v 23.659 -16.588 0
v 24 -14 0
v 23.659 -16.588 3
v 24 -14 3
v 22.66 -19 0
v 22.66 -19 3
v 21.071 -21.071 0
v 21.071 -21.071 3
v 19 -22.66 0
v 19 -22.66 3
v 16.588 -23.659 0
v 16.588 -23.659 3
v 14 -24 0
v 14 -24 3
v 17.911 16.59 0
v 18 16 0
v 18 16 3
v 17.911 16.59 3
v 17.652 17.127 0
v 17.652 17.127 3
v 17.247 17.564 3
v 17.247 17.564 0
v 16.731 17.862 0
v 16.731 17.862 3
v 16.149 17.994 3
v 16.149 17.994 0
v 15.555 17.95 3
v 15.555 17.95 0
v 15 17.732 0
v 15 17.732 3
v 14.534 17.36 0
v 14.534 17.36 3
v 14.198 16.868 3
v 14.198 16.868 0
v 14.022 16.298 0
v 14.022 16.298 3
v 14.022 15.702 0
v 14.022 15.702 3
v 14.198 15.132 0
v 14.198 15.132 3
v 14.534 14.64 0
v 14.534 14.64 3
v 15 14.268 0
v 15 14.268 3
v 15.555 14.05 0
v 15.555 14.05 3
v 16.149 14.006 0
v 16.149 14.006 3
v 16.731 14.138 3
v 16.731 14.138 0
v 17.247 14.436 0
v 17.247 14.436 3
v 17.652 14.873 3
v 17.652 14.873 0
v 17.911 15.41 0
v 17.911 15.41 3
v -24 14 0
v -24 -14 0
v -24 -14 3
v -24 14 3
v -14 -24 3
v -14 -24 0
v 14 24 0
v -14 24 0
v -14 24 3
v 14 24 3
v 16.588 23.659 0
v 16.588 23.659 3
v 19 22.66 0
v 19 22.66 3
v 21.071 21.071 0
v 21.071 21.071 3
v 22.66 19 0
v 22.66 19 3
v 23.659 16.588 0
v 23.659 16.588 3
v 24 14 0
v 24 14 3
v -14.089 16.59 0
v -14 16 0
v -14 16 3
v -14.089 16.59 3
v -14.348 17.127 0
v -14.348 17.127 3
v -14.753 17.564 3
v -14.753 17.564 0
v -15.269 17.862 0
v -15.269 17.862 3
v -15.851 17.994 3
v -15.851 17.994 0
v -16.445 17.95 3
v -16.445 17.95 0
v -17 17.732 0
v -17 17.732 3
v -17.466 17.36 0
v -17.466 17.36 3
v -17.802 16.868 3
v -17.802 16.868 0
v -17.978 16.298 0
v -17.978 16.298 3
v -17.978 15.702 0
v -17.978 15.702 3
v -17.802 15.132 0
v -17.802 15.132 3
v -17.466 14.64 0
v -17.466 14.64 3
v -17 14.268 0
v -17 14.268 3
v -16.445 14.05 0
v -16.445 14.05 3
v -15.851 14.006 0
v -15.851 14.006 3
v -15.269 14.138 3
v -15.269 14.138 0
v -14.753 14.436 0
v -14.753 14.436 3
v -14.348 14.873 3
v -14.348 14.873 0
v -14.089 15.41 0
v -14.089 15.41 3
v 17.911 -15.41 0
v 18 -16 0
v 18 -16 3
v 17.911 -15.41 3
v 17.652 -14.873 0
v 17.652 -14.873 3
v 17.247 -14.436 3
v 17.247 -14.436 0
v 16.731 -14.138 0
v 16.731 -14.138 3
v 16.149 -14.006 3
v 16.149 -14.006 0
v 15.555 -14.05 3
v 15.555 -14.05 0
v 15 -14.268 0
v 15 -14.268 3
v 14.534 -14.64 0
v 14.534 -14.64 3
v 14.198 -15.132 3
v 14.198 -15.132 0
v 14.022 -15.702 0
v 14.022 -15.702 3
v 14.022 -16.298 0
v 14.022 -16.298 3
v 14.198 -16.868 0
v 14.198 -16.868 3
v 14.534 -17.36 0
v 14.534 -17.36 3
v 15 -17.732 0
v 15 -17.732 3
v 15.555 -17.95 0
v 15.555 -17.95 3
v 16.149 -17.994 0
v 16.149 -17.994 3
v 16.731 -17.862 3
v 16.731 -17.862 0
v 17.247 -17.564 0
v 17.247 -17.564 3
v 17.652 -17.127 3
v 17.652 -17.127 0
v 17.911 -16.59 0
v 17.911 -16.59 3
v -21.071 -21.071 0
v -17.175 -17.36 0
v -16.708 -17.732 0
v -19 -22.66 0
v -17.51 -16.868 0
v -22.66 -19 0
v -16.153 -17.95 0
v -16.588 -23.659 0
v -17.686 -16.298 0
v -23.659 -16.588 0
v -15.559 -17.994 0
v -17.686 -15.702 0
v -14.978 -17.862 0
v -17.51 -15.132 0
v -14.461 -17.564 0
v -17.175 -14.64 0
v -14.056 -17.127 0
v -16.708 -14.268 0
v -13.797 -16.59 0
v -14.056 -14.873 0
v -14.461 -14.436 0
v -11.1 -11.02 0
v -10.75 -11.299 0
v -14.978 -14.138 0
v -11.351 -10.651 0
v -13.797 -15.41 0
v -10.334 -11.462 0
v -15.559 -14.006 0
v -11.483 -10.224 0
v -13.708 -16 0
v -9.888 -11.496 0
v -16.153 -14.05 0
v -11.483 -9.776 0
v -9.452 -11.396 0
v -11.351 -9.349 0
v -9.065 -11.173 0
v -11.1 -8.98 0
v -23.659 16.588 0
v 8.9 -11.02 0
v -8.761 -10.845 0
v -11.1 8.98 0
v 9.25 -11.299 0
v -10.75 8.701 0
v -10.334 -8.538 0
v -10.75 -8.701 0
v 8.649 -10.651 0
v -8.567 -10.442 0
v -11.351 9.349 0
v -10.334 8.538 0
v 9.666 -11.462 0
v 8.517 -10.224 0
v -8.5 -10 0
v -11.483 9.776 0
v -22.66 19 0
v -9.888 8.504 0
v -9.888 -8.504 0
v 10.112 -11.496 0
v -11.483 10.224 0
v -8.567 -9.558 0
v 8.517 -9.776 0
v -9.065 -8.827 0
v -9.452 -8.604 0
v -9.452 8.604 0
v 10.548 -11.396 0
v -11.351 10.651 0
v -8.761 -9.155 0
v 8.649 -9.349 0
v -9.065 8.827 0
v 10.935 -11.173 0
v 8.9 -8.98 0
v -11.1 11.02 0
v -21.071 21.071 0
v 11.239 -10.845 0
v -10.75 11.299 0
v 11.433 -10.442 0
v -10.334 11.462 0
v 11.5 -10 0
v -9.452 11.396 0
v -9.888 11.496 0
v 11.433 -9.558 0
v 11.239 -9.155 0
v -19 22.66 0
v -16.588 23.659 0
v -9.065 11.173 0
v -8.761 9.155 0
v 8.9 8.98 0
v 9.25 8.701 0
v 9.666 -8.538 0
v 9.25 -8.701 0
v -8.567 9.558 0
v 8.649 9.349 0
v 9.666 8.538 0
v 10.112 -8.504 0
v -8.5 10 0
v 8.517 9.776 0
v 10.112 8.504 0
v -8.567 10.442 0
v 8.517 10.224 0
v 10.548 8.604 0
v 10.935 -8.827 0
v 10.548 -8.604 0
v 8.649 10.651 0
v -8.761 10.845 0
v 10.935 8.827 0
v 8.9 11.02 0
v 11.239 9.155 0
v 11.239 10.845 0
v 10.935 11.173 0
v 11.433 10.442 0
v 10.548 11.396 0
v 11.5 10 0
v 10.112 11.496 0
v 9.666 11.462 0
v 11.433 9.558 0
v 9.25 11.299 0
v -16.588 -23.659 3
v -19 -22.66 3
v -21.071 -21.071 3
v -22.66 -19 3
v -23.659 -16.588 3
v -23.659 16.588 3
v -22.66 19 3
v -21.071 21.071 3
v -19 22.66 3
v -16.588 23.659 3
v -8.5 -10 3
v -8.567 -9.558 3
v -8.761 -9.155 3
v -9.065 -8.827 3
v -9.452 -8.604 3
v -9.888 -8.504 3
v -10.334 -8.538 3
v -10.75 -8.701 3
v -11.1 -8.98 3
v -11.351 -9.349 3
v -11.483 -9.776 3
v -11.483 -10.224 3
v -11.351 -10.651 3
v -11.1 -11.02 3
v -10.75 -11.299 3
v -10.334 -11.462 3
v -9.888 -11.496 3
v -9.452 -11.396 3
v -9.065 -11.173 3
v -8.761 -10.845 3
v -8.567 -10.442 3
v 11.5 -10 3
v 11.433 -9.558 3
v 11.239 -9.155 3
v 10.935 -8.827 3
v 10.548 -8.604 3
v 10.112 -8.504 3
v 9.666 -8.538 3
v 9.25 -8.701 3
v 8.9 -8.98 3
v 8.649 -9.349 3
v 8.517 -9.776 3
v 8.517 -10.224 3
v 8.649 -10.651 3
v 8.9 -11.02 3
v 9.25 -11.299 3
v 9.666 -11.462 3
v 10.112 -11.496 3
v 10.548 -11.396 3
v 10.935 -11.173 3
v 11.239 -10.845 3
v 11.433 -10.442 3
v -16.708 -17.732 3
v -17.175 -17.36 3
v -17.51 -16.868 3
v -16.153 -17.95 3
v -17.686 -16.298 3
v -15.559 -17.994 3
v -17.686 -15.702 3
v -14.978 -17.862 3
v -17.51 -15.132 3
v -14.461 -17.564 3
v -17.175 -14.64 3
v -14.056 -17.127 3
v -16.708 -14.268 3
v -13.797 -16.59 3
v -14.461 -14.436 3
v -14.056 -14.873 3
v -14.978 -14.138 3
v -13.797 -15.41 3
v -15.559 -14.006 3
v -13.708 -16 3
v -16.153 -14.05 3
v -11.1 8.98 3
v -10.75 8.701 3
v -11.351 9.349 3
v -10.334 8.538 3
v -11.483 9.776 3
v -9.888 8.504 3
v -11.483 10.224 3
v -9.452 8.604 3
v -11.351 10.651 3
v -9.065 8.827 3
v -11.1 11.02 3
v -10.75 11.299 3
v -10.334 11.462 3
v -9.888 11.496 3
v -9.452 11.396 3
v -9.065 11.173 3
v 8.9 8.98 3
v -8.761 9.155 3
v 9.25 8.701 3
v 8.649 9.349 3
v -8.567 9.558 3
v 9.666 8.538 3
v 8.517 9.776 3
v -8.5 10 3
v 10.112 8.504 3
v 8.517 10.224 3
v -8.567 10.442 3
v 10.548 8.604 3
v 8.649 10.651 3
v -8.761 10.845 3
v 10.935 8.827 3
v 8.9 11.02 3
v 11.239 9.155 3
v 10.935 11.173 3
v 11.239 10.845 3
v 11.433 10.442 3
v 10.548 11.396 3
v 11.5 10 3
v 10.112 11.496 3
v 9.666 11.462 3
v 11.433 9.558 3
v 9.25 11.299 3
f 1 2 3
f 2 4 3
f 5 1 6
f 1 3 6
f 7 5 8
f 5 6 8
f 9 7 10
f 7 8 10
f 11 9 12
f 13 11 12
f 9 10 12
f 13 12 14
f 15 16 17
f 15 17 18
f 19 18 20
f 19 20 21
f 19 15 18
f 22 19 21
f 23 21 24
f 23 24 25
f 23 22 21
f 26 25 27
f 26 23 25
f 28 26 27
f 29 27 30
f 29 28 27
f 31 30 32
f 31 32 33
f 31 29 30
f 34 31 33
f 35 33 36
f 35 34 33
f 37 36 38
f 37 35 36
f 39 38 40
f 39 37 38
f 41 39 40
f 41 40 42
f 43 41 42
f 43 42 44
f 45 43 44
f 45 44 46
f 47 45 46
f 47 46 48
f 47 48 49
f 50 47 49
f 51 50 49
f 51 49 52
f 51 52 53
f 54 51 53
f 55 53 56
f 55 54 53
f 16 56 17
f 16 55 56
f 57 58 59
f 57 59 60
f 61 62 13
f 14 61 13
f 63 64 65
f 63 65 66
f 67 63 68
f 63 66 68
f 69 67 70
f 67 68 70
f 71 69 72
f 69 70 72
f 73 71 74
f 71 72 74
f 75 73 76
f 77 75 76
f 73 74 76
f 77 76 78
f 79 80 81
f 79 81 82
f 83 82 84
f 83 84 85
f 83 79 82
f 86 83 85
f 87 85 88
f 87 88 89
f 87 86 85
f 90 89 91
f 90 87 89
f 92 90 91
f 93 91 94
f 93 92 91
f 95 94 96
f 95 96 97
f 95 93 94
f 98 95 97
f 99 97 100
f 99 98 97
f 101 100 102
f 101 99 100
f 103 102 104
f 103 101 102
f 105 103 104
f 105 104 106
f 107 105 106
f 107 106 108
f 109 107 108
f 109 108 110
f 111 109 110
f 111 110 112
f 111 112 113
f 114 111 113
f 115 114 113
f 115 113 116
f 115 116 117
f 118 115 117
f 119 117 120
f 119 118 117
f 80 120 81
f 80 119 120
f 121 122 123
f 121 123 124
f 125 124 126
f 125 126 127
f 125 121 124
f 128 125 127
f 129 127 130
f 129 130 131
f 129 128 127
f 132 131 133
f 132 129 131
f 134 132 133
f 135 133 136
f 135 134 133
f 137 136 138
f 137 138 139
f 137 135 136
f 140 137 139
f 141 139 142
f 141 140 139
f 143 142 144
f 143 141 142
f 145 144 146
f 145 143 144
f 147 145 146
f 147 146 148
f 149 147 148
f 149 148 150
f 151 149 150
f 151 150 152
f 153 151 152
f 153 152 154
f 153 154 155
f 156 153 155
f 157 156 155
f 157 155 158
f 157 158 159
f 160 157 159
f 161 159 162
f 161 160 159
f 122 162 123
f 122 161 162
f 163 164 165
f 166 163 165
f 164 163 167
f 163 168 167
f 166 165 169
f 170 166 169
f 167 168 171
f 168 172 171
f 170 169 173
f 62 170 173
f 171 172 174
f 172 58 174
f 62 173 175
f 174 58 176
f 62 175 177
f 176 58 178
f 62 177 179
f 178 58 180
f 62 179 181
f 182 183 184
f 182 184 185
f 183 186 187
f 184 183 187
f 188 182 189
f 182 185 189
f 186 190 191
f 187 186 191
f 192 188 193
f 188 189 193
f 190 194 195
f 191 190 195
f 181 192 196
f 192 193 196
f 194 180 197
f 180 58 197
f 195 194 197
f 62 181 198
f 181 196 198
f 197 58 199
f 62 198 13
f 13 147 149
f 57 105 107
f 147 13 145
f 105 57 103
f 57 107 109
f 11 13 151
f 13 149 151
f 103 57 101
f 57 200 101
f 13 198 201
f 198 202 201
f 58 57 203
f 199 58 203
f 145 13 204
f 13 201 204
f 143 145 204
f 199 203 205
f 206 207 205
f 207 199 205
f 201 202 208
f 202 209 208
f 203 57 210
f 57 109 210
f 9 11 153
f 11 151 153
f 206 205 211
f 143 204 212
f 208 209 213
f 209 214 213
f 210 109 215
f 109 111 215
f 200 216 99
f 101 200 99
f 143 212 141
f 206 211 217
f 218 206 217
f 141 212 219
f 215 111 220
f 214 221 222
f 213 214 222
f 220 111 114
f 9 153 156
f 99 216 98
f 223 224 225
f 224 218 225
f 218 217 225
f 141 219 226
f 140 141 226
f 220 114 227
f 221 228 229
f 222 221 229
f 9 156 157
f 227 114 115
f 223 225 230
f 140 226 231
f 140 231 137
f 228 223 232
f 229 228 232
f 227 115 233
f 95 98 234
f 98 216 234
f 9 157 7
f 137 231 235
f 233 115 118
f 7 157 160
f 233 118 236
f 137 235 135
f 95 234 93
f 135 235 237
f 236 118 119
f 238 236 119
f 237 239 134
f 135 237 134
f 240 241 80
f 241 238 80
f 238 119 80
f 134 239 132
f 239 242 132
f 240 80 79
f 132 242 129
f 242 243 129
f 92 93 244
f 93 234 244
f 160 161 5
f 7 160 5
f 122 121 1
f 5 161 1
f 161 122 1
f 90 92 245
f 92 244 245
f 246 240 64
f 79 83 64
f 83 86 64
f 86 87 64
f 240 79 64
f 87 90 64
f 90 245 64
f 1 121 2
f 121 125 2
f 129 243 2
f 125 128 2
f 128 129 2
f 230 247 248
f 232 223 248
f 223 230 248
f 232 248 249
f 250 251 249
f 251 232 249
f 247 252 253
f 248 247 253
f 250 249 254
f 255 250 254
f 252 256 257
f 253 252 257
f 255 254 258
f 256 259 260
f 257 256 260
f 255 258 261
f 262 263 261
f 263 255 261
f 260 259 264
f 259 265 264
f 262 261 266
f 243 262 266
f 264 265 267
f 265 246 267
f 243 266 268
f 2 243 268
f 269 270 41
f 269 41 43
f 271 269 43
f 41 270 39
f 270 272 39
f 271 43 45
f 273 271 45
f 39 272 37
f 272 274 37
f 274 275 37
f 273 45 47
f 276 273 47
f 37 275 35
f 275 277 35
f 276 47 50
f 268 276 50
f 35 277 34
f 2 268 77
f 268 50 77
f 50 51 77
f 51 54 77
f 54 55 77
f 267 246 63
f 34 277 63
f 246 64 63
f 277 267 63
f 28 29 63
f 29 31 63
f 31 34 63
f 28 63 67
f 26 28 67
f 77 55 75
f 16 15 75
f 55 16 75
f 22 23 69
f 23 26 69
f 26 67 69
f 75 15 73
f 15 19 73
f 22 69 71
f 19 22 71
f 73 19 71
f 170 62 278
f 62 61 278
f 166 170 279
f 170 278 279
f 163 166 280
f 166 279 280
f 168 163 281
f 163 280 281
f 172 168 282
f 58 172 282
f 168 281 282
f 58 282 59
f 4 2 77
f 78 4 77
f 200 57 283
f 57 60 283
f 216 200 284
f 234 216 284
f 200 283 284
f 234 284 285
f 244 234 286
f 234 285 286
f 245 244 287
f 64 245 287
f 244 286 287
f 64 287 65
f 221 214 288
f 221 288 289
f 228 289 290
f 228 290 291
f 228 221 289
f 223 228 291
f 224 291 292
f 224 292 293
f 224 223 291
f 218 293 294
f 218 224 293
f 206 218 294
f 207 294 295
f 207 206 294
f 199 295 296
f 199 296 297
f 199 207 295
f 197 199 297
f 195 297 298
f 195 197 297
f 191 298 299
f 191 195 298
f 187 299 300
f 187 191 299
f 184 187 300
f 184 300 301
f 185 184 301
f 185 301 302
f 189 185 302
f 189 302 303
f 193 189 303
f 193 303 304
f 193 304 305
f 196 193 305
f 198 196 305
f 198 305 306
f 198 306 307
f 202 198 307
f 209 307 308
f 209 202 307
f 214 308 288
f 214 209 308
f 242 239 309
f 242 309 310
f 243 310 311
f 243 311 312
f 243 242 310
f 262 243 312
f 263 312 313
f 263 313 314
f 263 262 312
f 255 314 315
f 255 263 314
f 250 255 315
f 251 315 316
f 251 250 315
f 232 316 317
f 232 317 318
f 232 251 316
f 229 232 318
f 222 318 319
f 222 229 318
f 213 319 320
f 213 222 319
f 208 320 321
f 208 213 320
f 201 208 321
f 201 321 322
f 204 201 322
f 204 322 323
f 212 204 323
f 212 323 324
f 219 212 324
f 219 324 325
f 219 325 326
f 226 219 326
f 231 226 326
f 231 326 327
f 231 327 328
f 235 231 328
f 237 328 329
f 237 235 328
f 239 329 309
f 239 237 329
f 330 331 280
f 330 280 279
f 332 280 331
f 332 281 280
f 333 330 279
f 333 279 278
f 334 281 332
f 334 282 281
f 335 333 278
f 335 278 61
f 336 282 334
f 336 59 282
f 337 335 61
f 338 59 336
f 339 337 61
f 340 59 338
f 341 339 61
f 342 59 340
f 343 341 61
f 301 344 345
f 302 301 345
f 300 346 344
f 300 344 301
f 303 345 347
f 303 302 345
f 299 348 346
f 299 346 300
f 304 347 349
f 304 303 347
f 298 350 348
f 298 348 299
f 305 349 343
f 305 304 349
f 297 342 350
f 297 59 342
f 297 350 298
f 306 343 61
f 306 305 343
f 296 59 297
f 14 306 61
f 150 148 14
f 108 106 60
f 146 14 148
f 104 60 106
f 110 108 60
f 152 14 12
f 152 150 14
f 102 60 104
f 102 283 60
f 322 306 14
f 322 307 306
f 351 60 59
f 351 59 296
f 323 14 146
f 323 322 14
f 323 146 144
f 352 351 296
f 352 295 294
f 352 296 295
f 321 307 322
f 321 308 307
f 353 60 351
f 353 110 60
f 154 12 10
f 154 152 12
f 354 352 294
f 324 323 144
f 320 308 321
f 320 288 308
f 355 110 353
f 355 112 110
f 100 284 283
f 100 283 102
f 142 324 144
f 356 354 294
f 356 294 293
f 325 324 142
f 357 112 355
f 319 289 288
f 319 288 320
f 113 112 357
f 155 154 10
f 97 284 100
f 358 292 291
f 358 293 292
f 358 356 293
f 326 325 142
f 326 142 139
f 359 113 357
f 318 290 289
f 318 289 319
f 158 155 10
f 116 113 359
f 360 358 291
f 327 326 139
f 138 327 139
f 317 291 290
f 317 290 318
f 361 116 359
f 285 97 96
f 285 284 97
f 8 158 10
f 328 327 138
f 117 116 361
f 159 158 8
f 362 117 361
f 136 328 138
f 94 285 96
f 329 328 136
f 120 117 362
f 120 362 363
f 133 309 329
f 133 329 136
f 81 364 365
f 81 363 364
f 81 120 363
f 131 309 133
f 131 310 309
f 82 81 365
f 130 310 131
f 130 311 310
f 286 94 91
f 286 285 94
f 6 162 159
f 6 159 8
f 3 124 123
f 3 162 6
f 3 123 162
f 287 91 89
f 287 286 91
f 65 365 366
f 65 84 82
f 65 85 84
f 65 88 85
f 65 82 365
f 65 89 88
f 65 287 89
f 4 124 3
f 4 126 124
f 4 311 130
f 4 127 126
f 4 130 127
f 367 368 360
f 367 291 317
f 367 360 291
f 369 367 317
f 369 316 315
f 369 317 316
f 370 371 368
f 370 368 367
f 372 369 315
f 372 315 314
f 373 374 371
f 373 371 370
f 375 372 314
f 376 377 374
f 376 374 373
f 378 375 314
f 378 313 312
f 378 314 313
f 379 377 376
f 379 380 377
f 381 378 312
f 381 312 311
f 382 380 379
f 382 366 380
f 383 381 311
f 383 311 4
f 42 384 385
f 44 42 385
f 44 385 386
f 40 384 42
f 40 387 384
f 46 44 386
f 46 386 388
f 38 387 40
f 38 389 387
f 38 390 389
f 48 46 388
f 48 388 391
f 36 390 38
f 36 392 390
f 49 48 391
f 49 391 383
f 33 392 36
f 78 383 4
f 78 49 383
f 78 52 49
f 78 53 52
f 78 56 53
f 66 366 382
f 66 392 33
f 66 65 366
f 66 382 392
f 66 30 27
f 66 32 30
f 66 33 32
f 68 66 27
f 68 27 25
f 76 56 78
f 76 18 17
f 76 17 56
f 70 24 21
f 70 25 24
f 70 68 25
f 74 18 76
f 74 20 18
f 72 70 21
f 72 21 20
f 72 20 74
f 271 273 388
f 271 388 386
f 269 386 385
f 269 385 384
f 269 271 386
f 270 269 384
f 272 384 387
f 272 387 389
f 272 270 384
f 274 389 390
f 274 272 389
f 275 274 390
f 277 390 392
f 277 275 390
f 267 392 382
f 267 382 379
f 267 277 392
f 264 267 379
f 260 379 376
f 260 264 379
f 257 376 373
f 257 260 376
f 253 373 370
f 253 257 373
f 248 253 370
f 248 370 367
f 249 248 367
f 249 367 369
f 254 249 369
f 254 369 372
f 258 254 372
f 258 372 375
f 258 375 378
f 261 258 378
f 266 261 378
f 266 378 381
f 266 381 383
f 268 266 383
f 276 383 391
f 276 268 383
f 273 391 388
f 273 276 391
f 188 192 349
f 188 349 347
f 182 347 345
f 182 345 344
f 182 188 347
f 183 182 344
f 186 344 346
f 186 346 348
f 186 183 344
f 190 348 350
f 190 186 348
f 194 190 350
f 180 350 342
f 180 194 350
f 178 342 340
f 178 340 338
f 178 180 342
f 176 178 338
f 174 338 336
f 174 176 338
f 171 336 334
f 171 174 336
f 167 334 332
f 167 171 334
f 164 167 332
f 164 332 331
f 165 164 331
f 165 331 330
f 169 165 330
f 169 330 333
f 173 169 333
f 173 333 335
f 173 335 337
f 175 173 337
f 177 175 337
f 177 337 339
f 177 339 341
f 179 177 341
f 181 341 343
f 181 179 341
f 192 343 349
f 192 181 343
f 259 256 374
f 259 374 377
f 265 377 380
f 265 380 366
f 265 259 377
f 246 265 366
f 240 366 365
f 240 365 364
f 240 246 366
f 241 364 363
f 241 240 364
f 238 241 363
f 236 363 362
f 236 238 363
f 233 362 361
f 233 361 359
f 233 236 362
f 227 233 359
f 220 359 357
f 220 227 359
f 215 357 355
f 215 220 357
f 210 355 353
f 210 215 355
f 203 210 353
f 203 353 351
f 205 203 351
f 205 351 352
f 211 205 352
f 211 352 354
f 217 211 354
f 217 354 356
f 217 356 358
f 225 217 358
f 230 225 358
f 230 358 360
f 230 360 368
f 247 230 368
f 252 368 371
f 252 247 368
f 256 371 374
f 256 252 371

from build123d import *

# Parameters (mm, degrees)
SKETCH1_W           = 48
SKETCH1_H           = 48
SKETCH1_R           = 1.5
SKETCH1_R_2         = 2
BOSS_EXTRUDE1_DEPTH = 3
FILLET1_R           = 10
FILLET2_R           = 10
FILLET3_R           = 10
FILLET4_R           = 10


with BuildPart() as part:
    # Sketch1 → Boss-Extrude1 (new body)
    with BuildSketch(Plane.XY):
        Rectangle(SKETCH1_W, SKETCH1_H)
        with Locations((10, 10)):
            Circle(SKETCH1_R, mode=Mode.SUBTRACT)
        with Locations((-10, 10)):
            Circle(SKETCH1_R, mode=Mode.SUBTRACT)
        with Locations((-10, -10)):
            Circle(SKETCH1_R, mode=Mode.SUBTRACT)
        with Locations((10, -10)):
            Circle(SKETCH1_R, mode=Mode.SUBTRACT)
        with Locations((-16, 16)):
            Circle(SKETCH1_R_2, mode=Mode.SUBTRACT)
        with Locations((16, 16)):
            Circle(SKETCH1_R_2, mode=Mode.SUBTRACT)
        with Locations((16, -16)):
            Circle(SKETCH1_R_2, mode=Mode.SUBTRACT)
        with Locations((-15.708422677, -16)):
            Circle(SKETCH1_R_2, mode=Mode.SUBTRACT)
    extrude(amount=BOSS_EXTRUDE1_DEPTH)

    # Fillet1
    fillet1_edges = [part.edges().sort_by_distance(p)[0] for p in [
        (-24, 24, 1.5),
    ]]
    fillet(fillet1_edges, radius=FILLET1_R)

    # Fillet2
    fillet2_edges = [part.edges().sort_by_distance(p)[0] for p in [
        (24, 24, 1.5),
    ]]
    fillet(fillet2_edges, radius=FILLET2_R)

    # Fillet3
    fillet3_edges = [part.edges().sort_by_distance(p)[0] for p in [
        (24, -24, 1.5),
    ]]
    fillet(fillet3_edges, radius=FILLET3_R)

    # Fillet4
    fillet4_edges = [part.edges().sort_by_distance(p)[0] for p in [
        (-24, -24, 1.5),
    ]]
    fillet(fillet4_edges, radius=FILLET4_R)


solid = part.part
